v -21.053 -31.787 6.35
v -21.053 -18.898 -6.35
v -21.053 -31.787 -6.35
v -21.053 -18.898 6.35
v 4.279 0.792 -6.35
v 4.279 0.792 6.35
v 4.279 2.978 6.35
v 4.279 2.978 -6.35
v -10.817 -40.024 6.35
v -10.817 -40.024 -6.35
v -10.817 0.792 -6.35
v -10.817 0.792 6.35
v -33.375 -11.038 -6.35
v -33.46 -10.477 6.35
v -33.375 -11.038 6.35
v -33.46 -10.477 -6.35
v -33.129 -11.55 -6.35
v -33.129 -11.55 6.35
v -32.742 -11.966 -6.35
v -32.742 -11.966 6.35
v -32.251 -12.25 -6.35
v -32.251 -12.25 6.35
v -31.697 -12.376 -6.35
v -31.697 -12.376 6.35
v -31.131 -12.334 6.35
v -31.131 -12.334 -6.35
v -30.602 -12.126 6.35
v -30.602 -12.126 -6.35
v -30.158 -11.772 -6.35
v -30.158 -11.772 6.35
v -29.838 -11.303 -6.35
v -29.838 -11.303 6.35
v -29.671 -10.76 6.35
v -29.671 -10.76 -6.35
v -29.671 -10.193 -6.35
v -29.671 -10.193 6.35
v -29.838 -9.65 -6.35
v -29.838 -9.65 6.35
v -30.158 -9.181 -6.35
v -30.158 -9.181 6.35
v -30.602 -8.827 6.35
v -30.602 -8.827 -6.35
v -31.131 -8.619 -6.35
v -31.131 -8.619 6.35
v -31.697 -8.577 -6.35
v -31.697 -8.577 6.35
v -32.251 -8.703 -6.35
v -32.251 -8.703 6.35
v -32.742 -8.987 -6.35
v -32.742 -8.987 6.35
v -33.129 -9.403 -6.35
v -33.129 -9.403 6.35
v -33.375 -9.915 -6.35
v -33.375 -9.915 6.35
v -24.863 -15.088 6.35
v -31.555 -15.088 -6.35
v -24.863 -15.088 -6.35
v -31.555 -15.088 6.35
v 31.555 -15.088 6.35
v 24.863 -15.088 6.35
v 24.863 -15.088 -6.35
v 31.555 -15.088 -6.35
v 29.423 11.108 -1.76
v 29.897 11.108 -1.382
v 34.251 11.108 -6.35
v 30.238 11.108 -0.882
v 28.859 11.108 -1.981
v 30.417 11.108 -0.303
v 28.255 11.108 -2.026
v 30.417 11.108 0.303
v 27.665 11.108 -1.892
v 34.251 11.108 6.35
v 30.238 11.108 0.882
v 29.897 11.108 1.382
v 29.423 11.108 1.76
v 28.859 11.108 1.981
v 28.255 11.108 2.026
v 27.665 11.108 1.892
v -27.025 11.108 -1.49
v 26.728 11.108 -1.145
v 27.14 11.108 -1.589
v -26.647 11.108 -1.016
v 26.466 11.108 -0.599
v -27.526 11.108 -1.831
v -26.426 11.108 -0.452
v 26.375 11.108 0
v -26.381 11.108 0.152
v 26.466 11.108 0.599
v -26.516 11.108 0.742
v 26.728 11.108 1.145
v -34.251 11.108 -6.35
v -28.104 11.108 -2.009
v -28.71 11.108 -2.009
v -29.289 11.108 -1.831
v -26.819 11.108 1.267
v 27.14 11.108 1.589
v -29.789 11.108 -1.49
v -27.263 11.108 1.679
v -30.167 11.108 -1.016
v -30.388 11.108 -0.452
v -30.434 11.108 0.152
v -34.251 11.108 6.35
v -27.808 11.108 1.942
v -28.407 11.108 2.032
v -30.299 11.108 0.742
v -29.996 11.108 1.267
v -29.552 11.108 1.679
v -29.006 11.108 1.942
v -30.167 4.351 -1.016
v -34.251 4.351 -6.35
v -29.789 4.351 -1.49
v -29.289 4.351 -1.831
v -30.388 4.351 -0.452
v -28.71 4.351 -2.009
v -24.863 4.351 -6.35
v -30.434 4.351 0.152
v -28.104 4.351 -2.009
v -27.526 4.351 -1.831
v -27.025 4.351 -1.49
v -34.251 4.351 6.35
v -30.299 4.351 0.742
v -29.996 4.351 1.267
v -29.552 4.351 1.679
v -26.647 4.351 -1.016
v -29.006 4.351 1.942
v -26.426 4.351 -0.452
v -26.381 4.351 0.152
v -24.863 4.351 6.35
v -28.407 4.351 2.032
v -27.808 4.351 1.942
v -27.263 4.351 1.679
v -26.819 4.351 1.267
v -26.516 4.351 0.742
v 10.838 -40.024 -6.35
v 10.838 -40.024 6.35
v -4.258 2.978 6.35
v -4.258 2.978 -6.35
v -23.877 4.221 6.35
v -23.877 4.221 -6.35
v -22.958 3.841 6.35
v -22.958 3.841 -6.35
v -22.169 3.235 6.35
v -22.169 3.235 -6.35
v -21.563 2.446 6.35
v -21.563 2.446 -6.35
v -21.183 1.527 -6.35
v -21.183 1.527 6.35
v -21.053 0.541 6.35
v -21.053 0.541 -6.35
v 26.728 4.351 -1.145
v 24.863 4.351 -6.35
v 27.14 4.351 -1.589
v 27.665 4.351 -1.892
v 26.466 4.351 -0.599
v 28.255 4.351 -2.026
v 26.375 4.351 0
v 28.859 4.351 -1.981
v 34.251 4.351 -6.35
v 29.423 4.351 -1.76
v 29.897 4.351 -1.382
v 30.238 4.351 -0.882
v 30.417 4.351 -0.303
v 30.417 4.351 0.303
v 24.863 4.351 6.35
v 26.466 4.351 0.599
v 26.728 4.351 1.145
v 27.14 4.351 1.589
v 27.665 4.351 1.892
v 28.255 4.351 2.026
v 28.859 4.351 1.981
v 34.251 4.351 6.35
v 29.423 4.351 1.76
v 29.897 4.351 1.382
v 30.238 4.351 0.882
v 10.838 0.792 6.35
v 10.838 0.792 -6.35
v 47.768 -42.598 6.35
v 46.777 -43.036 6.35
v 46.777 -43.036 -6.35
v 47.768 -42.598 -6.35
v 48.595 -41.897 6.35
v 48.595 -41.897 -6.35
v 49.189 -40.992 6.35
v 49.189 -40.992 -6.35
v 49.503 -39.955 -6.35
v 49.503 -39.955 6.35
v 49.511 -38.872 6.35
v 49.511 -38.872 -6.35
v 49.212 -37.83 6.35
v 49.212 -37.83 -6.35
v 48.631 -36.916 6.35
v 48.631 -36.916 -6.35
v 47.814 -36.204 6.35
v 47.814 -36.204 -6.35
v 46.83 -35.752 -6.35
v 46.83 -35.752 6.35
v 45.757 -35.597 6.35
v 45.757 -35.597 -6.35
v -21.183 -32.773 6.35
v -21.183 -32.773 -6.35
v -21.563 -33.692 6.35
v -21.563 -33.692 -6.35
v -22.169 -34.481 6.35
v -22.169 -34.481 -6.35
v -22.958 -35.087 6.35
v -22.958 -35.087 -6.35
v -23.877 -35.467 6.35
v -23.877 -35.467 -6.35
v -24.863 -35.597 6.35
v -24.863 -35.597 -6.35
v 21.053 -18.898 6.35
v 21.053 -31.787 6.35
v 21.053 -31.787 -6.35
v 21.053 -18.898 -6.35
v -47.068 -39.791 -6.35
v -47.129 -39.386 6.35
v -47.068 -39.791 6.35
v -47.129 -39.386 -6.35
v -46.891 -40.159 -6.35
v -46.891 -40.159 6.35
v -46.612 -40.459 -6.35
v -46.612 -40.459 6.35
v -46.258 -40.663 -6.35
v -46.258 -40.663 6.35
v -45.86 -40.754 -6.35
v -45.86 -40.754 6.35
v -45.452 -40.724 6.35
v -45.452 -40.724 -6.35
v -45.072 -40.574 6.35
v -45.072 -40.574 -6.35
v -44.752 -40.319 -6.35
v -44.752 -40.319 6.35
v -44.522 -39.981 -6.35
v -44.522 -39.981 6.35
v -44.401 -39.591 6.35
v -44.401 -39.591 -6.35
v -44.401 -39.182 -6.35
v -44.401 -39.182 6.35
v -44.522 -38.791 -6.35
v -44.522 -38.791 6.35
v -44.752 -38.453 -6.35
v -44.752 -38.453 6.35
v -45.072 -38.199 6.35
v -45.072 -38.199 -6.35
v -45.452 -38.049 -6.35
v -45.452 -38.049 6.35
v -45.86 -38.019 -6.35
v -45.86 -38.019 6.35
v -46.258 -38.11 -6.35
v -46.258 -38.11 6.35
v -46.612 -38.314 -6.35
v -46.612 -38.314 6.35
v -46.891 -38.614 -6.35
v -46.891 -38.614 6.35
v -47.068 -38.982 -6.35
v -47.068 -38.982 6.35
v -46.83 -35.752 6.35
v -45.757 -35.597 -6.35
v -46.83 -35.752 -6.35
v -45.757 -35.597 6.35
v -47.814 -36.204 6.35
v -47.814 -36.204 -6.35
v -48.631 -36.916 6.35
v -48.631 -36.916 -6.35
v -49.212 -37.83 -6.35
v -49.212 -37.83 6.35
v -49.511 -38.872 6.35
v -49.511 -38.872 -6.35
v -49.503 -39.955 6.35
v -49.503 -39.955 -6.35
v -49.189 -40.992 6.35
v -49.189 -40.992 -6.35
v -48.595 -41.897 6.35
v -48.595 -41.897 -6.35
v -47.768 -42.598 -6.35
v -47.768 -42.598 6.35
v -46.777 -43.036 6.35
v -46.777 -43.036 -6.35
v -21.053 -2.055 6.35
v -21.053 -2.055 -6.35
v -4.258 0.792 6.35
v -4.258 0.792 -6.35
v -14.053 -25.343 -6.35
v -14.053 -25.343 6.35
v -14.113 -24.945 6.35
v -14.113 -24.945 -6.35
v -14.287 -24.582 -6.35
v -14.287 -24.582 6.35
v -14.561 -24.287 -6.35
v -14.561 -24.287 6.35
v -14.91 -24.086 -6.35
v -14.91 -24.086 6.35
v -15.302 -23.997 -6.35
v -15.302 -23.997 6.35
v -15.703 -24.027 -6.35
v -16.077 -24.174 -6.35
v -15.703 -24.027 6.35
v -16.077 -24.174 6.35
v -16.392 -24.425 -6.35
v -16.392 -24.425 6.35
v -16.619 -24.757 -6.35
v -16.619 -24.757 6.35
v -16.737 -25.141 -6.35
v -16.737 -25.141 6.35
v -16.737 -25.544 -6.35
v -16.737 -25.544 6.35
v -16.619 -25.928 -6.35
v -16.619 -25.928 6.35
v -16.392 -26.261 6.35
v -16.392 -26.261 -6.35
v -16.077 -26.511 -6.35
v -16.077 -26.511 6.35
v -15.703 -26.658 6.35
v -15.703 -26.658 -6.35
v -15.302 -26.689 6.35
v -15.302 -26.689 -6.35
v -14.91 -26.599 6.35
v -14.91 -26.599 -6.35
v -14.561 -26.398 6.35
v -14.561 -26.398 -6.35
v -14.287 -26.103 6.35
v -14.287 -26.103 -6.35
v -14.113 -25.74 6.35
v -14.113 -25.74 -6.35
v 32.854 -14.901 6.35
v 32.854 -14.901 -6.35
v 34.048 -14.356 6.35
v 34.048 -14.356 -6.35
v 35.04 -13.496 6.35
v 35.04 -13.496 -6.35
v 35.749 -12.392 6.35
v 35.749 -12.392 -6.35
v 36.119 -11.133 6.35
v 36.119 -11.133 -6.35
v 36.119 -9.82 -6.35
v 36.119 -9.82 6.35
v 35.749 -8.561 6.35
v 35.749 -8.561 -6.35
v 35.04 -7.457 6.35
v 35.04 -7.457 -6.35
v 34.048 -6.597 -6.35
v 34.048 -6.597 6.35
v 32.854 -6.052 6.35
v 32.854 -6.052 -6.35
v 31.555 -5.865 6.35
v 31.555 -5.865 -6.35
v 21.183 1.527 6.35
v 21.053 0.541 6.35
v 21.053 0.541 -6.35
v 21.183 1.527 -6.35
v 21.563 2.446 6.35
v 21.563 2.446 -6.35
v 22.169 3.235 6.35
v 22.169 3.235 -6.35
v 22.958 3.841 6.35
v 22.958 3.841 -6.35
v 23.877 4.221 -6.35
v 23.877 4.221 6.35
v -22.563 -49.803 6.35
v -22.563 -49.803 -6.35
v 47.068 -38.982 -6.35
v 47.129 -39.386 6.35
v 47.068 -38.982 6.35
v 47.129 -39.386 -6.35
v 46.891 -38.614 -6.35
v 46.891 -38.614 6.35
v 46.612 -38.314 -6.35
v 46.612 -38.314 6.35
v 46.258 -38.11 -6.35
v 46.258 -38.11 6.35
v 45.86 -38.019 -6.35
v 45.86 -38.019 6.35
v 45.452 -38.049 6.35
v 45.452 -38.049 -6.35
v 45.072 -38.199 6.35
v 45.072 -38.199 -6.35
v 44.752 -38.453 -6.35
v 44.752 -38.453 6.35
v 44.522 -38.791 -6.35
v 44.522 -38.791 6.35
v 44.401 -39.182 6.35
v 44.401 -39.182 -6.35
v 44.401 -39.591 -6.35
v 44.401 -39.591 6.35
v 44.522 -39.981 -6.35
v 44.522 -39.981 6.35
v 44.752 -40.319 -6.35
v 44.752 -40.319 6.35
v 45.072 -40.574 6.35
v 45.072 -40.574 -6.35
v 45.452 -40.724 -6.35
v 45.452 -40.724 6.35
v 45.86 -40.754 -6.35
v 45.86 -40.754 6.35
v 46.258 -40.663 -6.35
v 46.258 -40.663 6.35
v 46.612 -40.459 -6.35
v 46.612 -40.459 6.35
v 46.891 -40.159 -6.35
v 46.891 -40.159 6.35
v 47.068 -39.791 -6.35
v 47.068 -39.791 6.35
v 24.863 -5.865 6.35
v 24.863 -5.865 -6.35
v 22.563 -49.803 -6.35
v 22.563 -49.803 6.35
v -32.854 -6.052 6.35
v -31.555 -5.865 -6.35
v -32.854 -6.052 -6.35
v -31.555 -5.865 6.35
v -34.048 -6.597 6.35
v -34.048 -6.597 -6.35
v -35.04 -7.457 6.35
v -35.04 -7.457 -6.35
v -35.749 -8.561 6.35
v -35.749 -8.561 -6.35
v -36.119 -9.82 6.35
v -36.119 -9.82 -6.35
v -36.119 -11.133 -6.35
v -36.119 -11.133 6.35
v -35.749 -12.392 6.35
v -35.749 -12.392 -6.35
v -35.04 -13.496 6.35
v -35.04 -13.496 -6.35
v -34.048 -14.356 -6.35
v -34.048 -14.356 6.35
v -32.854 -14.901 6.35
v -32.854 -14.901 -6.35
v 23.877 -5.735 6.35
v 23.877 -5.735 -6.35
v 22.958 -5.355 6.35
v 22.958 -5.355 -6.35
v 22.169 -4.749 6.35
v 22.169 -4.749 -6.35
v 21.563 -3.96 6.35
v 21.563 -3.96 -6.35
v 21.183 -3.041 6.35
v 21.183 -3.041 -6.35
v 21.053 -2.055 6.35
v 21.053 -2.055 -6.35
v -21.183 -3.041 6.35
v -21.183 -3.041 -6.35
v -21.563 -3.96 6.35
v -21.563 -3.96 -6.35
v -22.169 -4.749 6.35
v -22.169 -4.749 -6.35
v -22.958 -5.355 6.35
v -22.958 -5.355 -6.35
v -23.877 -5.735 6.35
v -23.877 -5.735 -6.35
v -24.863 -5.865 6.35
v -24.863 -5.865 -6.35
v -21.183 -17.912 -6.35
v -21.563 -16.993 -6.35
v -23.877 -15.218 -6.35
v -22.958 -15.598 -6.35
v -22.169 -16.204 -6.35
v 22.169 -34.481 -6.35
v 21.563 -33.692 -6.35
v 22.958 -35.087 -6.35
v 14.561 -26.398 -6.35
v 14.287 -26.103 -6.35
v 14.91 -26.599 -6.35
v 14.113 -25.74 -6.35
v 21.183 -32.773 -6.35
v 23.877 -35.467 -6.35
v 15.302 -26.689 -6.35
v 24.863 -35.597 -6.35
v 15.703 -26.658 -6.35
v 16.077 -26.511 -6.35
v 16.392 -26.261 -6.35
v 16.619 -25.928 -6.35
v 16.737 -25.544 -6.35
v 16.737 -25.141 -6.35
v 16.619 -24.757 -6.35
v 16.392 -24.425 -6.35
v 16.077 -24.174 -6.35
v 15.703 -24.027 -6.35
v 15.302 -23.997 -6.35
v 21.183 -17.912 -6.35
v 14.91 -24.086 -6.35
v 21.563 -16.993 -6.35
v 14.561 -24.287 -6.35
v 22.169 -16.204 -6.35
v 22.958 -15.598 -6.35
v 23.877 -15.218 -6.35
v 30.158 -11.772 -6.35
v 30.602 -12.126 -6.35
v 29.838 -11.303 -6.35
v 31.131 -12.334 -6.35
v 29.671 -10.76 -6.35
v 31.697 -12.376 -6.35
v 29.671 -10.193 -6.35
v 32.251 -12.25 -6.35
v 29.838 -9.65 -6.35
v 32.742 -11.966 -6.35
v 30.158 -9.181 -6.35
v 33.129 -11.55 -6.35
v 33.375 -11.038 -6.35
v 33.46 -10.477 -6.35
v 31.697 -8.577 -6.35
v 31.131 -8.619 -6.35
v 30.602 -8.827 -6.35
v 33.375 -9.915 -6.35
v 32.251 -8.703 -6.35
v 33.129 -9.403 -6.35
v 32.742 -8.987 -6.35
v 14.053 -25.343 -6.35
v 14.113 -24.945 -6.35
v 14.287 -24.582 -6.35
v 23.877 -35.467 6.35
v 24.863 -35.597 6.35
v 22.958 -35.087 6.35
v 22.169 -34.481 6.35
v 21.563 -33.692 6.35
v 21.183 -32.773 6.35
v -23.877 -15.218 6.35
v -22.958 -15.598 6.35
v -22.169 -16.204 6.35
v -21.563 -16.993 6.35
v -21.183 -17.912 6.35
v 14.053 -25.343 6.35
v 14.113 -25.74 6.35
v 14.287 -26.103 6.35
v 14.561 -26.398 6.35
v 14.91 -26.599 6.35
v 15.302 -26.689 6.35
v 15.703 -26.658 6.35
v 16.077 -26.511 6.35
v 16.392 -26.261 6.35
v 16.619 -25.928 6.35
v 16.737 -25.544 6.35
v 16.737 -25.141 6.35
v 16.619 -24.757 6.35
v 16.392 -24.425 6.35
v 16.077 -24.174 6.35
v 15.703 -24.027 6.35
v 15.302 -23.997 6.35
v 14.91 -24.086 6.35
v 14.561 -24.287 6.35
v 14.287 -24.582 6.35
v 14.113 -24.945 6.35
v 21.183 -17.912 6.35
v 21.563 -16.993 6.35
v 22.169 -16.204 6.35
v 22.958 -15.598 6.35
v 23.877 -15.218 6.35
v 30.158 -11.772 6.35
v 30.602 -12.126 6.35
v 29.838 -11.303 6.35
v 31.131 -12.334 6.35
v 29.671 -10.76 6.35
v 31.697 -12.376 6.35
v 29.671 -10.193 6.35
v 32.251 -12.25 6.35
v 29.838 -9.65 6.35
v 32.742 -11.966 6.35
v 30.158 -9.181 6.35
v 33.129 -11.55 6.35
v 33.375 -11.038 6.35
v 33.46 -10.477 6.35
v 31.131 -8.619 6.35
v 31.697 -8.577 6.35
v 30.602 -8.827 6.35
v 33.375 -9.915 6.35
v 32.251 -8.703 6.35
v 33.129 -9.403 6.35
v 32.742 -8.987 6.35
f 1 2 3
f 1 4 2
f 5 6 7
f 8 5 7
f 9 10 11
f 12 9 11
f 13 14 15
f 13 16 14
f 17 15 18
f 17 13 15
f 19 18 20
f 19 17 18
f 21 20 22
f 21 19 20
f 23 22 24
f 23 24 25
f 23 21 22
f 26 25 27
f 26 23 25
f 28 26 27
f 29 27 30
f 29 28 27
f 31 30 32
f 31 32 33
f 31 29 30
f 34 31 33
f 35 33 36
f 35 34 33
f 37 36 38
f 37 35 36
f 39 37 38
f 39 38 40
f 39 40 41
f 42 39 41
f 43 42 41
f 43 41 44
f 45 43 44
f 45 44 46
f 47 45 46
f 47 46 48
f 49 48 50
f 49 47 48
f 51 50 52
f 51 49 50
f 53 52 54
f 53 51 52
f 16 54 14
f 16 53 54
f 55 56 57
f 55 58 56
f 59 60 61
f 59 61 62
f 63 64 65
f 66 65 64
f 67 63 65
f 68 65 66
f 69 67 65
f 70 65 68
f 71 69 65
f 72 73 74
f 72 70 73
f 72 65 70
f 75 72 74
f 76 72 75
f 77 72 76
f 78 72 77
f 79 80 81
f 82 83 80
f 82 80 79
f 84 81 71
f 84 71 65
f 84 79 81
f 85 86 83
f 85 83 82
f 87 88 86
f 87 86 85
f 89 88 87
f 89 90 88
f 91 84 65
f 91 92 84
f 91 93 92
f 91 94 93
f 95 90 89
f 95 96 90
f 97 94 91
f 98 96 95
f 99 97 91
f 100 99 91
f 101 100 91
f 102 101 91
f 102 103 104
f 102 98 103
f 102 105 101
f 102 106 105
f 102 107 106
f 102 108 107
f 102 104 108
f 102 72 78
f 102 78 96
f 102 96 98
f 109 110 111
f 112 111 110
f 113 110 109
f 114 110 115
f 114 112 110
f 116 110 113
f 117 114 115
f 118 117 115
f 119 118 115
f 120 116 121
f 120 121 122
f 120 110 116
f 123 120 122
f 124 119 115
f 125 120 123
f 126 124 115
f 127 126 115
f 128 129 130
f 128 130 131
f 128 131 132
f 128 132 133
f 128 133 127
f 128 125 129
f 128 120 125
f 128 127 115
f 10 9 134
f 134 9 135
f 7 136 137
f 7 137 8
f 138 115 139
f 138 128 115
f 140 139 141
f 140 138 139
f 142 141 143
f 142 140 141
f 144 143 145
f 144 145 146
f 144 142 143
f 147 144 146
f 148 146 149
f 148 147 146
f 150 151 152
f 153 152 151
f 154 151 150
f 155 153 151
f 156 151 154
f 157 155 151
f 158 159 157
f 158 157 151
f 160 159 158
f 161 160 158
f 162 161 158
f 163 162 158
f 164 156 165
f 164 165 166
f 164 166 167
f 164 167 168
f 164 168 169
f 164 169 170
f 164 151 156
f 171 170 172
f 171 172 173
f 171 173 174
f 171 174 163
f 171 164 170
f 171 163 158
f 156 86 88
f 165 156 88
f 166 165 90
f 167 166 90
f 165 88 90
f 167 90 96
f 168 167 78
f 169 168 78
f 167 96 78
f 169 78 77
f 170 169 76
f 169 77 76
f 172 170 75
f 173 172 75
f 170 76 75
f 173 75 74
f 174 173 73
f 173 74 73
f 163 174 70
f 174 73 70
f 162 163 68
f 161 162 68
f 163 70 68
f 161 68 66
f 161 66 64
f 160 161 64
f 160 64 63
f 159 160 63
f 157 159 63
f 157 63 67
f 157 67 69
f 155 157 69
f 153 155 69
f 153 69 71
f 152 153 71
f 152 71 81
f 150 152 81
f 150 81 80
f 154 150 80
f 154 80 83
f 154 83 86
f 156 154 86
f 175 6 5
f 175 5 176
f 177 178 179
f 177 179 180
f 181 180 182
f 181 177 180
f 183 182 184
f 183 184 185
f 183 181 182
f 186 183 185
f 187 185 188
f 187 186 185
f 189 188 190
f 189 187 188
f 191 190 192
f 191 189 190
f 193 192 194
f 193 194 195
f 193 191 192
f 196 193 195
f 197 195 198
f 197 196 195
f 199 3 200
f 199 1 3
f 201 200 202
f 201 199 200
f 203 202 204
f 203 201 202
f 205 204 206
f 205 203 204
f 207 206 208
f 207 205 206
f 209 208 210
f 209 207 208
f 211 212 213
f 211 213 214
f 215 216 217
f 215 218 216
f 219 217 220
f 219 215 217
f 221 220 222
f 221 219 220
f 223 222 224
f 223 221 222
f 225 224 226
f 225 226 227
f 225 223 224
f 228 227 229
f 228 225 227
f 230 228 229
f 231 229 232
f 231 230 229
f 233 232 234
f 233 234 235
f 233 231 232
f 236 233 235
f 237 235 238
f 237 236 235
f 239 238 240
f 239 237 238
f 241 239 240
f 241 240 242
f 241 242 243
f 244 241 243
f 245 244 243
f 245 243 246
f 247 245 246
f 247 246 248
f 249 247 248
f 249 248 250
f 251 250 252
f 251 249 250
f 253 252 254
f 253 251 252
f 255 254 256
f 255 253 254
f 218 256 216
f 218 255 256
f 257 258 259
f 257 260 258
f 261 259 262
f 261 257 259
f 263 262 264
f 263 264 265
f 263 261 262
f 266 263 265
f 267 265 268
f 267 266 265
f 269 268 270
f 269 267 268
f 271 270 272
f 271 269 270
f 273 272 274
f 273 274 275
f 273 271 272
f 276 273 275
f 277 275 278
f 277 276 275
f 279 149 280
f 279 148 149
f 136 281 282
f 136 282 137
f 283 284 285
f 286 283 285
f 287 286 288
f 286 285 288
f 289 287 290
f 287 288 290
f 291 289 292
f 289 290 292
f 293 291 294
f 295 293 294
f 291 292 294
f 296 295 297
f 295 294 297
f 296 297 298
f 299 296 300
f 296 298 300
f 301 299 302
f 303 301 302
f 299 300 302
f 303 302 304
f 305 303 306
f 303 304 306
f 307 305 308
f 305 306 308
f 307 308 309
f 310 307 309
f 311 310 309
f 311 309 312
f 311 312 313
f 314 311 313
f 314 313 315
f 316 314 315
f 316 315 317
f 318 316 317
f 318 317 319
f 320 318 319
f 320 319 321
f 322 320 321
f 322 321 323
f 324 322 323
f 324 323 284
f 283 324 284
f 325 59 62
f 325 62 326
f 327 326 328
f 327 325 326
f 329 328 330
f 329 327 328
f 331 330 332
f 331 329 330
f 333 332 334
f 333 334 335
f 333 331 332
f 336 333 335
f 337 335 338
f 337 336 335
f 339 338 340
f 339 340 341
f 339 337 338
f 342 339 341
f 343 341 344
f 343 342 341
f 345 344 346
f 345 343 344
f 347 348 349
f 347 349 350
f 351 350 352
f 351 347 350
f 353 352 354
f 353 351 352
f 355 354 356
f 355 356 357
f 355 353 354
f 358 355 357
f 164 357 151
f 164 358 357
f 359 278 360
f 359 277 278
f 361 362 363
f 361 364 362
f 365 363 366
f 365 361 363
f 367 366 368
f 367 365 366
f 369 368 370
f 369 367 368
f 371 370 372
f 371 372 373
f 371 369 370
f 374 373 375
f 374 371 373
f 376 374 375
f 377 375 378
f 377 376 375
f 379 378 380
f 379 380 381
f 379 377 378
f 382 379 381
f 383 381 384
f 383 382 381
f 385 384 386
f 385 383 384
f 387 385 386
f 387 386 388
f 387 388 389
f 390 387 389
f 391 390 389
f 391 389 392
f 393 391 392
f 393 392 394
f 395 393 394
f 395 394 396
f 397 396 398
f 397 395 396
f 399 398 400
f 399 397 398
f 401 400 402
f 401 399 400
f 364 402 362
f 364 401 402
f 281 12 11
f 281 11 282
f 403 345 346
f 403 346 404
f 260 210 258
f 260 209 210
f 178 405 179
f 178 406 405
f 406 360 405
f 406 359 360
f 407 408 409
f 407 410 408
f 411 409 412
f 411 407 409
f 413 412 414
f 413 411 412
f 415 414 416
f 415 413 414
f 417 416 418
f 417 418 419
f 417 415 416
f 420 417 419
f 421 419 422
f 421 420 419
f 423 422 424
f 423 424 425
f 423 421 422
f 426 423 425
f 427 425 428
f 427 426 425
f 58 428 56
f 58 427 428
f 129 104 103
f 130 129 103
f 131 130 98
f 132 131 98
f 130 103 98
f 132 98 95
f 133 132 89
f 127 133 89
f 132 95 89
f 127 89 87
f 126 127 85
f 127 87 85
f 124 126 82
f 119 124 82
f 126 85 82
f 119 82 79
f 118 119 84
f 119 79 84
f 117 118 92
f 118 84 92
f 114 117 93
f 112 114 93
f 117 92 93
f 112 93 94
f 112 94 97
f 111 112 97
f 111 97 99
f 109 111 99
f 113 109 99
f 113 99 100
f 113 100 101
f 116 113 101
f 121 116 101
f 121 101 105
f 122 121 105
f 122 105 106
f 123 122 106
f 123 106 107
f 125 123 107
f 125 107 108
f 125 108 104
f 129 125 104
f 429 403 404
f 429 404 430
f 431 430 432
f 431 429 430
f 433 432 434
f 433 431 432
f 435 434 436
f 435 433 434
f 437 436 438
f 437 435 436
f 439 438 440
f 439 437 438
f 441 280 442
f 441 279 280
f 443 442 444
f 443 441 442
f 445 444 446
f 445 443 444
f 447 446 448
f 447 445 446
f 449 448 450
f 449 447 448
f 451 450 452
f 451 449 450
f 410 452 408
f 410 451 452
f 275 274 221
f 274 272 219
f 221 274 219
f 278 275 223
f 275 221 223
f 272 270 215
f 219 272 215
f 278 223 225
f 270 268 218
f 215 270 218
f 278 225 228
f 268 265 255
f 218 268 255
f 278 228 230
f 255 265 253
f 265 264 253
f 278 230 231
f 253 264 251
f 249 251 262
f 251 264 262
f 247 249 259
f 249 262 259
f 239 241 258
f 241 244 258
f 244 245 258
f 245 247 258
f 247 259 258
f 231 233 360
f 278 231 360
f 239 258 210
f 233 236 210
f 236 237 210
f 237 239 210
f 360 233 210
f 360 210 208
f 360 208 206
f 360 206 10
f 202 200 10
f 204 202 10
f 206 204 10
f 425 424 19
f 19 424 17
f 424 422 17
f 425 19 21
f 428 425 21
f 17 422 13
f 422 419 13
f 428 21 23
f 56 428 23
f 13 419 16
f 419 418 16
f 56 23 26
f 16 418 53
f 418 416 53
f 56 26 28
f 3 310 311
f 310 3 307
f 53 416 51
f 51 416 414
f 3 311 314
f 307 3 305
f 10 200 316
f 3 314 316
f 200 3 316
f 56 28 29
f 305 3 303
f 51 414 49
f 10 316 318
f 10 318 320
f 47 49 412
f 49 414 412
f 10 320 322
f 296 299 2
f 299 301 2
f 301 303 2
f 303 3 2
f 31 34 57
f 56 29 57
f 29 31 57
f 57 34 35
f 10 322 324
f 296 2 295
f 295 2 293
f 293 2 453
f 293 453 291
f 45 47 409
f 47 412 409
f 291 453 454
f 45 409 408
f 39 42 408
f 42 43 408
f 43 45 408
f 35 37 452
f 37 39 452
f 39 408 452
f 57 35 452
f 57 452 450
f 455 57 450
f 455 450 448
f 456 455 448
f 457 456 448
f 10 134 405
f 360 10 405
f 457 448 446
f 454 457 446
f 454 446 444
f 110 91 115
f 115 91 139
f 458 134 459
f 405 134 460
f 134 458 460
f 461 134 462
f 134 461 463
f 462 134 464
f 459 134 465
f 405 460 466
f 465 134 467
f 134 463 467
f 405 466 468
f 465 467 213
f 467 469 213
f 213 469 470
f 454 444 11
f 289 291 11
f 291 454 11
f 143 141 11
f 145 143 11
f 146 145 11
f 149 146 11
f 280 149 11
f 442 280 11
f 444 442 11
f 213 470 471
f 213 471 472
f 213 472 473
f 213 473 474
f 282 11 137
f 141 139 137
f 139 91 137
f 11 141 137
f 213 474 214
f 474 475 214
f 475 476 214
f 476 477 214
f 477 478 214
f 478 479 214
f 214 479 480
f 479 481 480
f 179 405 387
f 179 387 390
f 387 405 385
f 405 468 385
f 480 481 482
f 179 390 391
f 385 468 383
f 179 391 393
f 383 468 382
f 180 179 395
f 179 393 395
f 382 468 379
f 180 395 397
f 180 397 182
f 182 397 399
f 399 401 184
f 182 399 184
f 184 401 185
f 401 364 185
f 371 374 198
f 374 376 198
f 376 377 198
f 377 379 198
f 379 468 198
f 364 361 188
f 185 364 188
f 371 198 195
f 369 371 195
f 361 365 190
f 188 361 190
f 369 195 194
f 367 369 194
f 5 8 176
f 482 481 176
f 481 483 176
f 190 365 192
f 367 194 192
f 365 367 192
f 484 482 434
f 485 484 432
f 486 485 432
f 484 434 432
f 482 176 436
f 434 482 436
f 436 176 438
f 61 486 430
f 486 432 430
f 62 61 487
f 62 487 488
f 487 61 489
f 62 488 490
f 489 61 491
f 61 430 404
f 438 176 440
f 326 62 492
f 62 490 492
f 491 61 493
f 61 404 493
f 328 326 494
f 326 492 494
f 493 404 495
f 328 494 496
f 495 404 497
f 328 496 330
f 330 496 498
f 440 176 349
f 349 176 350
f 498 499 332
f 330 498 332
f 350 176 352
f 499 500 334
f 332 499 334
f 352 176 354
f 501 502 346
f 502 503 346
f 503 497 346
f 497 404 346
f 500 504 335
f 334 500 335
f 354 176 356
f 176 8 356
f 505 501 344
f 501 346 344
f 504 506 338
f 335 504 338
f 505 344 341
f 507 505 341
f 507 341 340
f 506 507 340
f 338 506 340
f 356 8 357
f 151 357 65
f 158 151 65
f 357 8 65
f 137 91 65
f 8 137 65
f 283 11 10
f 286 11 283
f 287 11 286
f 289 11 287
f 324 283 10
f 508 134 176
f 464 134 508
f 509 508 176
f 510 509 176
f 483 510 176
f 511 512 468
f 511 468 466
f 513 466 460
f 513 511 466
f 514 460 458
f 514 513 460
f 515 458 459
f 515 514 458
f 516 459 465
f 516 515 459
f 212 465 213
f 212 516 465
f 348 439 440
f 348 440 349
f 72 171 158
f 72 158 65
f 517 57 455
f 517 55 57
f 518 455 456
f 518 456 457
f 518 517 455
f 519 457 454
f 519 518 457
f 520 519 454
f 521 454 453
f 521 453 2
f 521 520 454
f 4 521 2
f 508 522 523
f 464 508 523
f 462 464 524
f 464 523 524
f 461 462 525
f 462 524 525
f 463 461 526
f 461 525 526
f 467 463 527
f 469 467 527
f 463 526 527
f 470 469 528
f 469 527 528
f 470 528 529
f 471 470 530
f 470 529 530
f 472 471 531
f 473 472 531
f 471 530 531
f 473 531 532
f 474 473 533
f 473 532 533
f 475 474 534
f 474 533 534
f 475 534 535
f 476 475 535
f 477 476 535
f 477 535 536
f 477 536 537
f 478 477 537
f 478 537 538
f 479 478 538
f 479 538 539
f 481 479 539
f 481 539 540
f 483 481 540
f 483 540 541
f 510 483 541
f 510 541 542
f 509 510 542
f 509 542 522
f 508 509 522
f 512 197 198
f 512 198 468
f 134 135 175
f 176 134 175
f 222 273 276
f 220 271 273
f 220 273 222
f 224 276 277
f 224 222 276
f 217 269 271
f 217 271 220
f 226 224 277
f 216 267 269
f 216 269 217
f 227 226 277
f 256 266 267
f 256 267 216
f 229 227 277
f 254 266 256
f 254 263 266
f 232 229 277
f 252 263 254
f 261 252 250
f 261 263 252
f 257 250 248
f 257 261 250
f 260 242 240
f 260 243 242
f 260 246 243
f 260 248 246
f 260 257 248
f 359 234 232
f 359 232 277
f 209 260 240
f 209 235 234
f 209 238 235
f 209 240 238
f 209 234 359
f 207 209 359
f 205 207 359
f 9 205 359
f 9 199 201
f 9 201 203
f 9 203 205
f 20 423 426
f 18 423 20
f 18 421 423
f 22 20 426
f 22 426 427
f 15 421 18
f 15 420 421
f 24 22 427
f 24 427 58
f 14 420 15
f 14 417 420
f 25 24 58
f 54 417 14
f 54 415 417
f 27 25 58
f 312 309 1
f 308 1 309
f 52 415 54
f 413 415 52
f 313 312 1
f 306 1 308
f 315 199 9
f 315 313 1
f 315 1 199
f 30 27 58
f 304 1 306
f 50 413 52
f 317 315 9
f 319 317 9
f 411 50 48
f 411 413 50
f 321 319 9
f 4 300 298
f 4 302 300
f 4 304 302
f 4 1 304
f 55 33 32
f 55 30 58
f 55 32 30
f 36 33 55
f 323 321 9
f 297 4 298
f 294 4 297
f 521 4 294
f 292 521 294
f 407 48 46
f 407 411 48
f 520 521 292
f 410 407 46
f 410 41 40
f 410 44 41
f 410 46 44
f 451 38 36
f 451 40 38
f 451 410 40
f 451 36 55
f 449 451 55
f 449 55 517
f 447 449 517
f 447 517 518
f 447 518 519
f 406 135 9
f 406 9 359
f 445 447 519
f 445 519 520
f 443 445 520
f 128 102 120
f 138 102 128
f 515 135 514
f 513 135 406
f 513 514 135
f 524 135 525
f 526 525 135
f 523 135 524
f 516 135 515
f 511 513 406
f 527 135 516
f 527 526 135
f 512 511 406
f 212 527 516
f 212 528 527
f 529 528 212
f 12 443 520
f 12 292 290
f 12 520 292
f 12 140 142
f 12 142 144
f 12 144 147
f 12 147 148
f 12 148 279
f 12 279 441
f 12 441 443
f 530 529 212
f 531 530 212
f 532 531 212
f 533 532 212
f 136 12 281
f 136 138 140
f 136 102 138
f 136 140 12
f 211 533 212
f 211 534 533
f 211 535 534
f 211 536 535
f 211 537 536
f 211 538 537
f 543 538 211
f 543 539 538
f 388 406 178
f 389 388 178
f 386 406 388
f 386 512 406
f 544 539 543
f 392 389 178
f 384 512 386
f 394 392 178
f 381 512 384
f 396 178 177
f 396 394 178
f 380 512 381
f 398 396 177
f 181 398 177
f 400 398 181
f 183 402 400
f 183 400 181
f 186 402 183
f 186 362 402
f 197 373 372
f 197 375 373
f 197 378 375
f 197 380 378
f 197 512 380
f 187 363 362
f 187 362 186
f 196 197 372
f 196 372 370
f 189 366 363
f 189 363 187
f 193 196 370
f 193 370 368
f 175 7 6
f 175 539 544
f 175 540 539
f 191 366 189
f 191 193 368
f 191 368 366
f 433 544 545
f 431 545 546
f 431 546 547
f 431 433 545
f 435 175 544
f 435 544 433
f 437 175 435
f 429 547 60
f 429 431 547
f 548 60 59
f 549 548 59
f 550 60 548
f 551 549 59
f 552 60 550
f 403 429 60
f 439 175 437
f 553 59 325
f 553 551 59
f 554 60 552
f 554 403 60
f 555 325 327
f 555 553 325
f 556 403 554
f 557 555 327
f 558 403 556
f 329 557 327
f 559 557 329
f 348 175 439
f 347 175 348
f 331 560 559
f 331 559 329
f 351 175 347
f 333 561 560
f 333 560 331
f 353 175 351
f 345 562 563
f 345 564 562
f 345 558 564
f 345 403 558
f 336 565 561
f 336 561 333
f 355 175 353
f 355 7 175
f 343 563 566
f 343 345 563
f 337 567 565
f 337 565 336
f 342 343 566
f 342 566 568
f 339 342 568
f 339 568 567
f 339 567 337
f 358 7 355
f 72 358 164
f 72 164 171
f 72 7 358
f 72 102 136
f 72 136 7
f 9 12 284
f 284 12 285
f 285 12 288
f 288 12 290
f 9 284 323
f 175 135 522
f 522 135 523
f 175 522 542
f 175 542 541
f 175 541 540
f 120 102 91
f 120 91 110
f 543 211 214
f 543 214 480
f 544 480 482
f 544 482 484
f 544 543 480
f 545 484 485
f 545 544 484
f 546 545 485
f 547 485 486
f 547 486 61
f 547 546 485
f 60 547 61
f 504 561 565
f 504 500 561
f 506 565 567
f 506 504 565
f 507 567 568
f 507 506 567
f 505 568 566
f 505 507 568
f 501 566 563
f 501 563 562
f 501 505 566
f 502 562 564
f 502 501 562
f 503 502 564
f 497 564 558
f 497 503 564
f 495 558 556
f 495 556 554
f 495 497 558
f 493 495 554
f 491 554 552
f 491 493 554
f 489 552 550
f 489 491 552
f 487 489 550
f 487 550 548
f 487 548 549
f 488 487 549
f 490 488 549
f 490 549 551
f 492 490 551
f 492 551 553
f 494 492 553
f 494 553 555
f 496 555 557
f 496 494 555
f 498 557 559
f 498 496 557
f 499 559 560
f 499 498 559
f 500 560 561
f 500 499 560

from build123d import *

# Parameters (mm, degrees)
SKETCH1_R          = 1.3716
SKETCH1_R_2        = 1.905
SKETCH1_W          = 21.654448346
SKETCH1_H          = 40.81550601
EXTRUDE1_DEPTH     = 6.35
SKETCH2_R          = 2.032
EXTRUDE2_DEPTH     = 12.7
SKETCH3_R          = 1.349669532
CUT_EXTRUDE1_DEPTH = 72.389643478
SKETCH4_W          = 8.536869312
SKETCH4_H          = 4.372972384
CUT_EXTRUDE2_DEPTH = 72.389643478


with BuildPart() as part:
    # Sketch1 → Extrude1 (new, symmetric)
    with BuildSketch(Plane.XY):
        with BuildLine():
            Line((22.563049012, -49.803089557), (46.777222737, -43.035560041))
            ThreePointArc((46.777222737, -43.035560041), (49.511252826, -38.871621578), (45.757317366, -35.59728613))
            Line((45.757317366, -35.59728613), (24.862986263, -35.59728613))
            ThreePointArc((24.862986263, -35.59728613), (22.168909426, -34.481362966), (21.052986263, -31.78728613))
            Line((21.052986263, -31.78728613), (21.052986263, -18.898003738))
            ThreePointArc((21.052986263, -18.898003738), (22.168909426, -16.203926902), (24.862986263, -15.088003738))
            Line((24.862986263, -15.088003738), (31.554570289, -15.088003738))
            ThreePointArc((31.554570289, -15.088003738), (36.166042792, -10.476531235), (31.554570289, -5.865058732))
            Line((31.554570289, -5.865058732), (24.862986263, -5.865058732))
            ThreePointArc((24.862986263, -5.865058732), (22.168909426, -4.749135569), (21.052986263, -2.055058732))
            Line((21.052986263, -2.055058732), (21.052986263, 0.541184861))
            ThreePointArc((21.052986263, 0.541184861), (22.168909426, 3.235261698), (24.862986263, 4.351184861))
            Line((24.862986263, 4.351184861), (34.251425283, 4.351184861))
            Line((34.251425283, 4.351184861), (34.251425283, 11.107663069))
            Line((34.251425283, 11.107663069), (-34.251425283, 11.107663069))
            Line((-34.251425283, 11.107663069), (-34.251425283, 4.351184861))
            Line((-34.251425283, 4.351184861), (-24.862986263, 4.351184861))
            ThreePointArc((-24.862986263, 4.351184861), (-22.168909426, 3.235261698), (-21.052986263, 0.541184861))
            Line((-21.052986263, 0.541184861), (-21.052986263, -2.055058732))
            ThreePointArc((-21.052986263, -2.055058732), (-22.168909426, -4.749135569), (-24.862986263, -5.865058732))
            Line((-24.862986263, -5.865058732), (-31.554570289, -5.865058732))
            ThreePointArc((-31.554570289, -5.865058732), (-36.166042792, -10.476531235), (-31.554570289, -15.088003738))
            Line((-31.554570289, -15.088003738), (-24.862986263, -15.088003738))
            ThreePointArc((-24.862986263, -15.088003738), (-22.168909426, -16.203926902), (-21.052986263, -18.898003738))
            Line((-21.052986263, -18.898003738), (-21.052986263, -31.78728613))
            ThreePointArc((-21.052986263, -31.78728613), (-22.168909426, -34.481362966), (-24.862986263, -35.59728613))
            Line((-24.862986263, -35.59728613), (-45.757317366, -35.59728613))
            ThreePointArc((-45.757317366, -35.59728613), (-49.511252826, -38.871621578), (-46.777222737, -43.035560041))
            Line((-46.777222737, -43.035560041), (-22.563049012, -49.803089557))
            Line((-22.563049012, -49.803089557), (22.563049012, -49.803089557))
        make_face()
        with Locations((45.757317366, -39.38634569)):
            Circle(SKETCH1_R, mode=Mode.SUBTRACT)
        with Locations((31.554570289, -10.476531235)):
            Circle(SKETCH1_R_2, mode=Mode.SUBTRACT)
        with Locations(Location((-31.554570289, -10.476531235, 0), (0, 0, 180))):
            Circle(SKETCH1_R_2, mode=Mode.SUBTRACT)
        with Locations(Location((-45.757317366, -39.38634569, 0), (0, 0, 180))):
            Circle(SKETCH1_R, mode=Mode.SUBTRACT)
        with Locations((0.010545216, -19.616016269)):
            Rectangle(SKETCH1_W, SKETCH1_H, mode=Mode.SUBTRACT)
    extrude(amount=EXTRUDE1_DEPTH, both=True)

    # Sketch2 → Extrude2 (cut)
    with BuildSketch(Plane(origin=(0, 11.107663069, 0), x_dir=(1, 0, 0), z_dir=(0, 1, 0))):
        with Locations(Location((28.407237147, 0, 0), (0, 0, 180))):
            Circle(SKETCH2_R)
        with Locations(Location((-28.407237147, 0, 0), (0, 0, 270))):
            Circle(SKETCH2_R)
    extrude(amount=-EXTRUDE2_DEPTH, mode=Mode.SUBTRACT)

    # Sketch3 → Cut-Extrude1 (cut, through all)
    with BuildSketch(Plane.XY.offset(6.35)):
        with Locations((-15.402624173, -25.342644934)):
            Circle(SKETCH3_R)
        with Locations(Location((15.402624173, -25.342644934, 0), (0, 0, 180))):
            Circle(SKETCH3_R)
    extrude(amount=-CUT_EXTRUDE1_DEPTH, mode=Mode.SUBTRACT)

    # Sketch4 → Cut-Extrude2 (cut, through all)
    with BuildSketch(Plane.XY.offset(6.35)):
        with Locations((0.010545216, 0.791736736)):
            Rectangle(SKETCH4_W, SKETCH4_H)
    extrude(amount=-CUT_EXTRUDE2_DEPTH, mode=Mode.SUBTRACT)


solid = part.part
